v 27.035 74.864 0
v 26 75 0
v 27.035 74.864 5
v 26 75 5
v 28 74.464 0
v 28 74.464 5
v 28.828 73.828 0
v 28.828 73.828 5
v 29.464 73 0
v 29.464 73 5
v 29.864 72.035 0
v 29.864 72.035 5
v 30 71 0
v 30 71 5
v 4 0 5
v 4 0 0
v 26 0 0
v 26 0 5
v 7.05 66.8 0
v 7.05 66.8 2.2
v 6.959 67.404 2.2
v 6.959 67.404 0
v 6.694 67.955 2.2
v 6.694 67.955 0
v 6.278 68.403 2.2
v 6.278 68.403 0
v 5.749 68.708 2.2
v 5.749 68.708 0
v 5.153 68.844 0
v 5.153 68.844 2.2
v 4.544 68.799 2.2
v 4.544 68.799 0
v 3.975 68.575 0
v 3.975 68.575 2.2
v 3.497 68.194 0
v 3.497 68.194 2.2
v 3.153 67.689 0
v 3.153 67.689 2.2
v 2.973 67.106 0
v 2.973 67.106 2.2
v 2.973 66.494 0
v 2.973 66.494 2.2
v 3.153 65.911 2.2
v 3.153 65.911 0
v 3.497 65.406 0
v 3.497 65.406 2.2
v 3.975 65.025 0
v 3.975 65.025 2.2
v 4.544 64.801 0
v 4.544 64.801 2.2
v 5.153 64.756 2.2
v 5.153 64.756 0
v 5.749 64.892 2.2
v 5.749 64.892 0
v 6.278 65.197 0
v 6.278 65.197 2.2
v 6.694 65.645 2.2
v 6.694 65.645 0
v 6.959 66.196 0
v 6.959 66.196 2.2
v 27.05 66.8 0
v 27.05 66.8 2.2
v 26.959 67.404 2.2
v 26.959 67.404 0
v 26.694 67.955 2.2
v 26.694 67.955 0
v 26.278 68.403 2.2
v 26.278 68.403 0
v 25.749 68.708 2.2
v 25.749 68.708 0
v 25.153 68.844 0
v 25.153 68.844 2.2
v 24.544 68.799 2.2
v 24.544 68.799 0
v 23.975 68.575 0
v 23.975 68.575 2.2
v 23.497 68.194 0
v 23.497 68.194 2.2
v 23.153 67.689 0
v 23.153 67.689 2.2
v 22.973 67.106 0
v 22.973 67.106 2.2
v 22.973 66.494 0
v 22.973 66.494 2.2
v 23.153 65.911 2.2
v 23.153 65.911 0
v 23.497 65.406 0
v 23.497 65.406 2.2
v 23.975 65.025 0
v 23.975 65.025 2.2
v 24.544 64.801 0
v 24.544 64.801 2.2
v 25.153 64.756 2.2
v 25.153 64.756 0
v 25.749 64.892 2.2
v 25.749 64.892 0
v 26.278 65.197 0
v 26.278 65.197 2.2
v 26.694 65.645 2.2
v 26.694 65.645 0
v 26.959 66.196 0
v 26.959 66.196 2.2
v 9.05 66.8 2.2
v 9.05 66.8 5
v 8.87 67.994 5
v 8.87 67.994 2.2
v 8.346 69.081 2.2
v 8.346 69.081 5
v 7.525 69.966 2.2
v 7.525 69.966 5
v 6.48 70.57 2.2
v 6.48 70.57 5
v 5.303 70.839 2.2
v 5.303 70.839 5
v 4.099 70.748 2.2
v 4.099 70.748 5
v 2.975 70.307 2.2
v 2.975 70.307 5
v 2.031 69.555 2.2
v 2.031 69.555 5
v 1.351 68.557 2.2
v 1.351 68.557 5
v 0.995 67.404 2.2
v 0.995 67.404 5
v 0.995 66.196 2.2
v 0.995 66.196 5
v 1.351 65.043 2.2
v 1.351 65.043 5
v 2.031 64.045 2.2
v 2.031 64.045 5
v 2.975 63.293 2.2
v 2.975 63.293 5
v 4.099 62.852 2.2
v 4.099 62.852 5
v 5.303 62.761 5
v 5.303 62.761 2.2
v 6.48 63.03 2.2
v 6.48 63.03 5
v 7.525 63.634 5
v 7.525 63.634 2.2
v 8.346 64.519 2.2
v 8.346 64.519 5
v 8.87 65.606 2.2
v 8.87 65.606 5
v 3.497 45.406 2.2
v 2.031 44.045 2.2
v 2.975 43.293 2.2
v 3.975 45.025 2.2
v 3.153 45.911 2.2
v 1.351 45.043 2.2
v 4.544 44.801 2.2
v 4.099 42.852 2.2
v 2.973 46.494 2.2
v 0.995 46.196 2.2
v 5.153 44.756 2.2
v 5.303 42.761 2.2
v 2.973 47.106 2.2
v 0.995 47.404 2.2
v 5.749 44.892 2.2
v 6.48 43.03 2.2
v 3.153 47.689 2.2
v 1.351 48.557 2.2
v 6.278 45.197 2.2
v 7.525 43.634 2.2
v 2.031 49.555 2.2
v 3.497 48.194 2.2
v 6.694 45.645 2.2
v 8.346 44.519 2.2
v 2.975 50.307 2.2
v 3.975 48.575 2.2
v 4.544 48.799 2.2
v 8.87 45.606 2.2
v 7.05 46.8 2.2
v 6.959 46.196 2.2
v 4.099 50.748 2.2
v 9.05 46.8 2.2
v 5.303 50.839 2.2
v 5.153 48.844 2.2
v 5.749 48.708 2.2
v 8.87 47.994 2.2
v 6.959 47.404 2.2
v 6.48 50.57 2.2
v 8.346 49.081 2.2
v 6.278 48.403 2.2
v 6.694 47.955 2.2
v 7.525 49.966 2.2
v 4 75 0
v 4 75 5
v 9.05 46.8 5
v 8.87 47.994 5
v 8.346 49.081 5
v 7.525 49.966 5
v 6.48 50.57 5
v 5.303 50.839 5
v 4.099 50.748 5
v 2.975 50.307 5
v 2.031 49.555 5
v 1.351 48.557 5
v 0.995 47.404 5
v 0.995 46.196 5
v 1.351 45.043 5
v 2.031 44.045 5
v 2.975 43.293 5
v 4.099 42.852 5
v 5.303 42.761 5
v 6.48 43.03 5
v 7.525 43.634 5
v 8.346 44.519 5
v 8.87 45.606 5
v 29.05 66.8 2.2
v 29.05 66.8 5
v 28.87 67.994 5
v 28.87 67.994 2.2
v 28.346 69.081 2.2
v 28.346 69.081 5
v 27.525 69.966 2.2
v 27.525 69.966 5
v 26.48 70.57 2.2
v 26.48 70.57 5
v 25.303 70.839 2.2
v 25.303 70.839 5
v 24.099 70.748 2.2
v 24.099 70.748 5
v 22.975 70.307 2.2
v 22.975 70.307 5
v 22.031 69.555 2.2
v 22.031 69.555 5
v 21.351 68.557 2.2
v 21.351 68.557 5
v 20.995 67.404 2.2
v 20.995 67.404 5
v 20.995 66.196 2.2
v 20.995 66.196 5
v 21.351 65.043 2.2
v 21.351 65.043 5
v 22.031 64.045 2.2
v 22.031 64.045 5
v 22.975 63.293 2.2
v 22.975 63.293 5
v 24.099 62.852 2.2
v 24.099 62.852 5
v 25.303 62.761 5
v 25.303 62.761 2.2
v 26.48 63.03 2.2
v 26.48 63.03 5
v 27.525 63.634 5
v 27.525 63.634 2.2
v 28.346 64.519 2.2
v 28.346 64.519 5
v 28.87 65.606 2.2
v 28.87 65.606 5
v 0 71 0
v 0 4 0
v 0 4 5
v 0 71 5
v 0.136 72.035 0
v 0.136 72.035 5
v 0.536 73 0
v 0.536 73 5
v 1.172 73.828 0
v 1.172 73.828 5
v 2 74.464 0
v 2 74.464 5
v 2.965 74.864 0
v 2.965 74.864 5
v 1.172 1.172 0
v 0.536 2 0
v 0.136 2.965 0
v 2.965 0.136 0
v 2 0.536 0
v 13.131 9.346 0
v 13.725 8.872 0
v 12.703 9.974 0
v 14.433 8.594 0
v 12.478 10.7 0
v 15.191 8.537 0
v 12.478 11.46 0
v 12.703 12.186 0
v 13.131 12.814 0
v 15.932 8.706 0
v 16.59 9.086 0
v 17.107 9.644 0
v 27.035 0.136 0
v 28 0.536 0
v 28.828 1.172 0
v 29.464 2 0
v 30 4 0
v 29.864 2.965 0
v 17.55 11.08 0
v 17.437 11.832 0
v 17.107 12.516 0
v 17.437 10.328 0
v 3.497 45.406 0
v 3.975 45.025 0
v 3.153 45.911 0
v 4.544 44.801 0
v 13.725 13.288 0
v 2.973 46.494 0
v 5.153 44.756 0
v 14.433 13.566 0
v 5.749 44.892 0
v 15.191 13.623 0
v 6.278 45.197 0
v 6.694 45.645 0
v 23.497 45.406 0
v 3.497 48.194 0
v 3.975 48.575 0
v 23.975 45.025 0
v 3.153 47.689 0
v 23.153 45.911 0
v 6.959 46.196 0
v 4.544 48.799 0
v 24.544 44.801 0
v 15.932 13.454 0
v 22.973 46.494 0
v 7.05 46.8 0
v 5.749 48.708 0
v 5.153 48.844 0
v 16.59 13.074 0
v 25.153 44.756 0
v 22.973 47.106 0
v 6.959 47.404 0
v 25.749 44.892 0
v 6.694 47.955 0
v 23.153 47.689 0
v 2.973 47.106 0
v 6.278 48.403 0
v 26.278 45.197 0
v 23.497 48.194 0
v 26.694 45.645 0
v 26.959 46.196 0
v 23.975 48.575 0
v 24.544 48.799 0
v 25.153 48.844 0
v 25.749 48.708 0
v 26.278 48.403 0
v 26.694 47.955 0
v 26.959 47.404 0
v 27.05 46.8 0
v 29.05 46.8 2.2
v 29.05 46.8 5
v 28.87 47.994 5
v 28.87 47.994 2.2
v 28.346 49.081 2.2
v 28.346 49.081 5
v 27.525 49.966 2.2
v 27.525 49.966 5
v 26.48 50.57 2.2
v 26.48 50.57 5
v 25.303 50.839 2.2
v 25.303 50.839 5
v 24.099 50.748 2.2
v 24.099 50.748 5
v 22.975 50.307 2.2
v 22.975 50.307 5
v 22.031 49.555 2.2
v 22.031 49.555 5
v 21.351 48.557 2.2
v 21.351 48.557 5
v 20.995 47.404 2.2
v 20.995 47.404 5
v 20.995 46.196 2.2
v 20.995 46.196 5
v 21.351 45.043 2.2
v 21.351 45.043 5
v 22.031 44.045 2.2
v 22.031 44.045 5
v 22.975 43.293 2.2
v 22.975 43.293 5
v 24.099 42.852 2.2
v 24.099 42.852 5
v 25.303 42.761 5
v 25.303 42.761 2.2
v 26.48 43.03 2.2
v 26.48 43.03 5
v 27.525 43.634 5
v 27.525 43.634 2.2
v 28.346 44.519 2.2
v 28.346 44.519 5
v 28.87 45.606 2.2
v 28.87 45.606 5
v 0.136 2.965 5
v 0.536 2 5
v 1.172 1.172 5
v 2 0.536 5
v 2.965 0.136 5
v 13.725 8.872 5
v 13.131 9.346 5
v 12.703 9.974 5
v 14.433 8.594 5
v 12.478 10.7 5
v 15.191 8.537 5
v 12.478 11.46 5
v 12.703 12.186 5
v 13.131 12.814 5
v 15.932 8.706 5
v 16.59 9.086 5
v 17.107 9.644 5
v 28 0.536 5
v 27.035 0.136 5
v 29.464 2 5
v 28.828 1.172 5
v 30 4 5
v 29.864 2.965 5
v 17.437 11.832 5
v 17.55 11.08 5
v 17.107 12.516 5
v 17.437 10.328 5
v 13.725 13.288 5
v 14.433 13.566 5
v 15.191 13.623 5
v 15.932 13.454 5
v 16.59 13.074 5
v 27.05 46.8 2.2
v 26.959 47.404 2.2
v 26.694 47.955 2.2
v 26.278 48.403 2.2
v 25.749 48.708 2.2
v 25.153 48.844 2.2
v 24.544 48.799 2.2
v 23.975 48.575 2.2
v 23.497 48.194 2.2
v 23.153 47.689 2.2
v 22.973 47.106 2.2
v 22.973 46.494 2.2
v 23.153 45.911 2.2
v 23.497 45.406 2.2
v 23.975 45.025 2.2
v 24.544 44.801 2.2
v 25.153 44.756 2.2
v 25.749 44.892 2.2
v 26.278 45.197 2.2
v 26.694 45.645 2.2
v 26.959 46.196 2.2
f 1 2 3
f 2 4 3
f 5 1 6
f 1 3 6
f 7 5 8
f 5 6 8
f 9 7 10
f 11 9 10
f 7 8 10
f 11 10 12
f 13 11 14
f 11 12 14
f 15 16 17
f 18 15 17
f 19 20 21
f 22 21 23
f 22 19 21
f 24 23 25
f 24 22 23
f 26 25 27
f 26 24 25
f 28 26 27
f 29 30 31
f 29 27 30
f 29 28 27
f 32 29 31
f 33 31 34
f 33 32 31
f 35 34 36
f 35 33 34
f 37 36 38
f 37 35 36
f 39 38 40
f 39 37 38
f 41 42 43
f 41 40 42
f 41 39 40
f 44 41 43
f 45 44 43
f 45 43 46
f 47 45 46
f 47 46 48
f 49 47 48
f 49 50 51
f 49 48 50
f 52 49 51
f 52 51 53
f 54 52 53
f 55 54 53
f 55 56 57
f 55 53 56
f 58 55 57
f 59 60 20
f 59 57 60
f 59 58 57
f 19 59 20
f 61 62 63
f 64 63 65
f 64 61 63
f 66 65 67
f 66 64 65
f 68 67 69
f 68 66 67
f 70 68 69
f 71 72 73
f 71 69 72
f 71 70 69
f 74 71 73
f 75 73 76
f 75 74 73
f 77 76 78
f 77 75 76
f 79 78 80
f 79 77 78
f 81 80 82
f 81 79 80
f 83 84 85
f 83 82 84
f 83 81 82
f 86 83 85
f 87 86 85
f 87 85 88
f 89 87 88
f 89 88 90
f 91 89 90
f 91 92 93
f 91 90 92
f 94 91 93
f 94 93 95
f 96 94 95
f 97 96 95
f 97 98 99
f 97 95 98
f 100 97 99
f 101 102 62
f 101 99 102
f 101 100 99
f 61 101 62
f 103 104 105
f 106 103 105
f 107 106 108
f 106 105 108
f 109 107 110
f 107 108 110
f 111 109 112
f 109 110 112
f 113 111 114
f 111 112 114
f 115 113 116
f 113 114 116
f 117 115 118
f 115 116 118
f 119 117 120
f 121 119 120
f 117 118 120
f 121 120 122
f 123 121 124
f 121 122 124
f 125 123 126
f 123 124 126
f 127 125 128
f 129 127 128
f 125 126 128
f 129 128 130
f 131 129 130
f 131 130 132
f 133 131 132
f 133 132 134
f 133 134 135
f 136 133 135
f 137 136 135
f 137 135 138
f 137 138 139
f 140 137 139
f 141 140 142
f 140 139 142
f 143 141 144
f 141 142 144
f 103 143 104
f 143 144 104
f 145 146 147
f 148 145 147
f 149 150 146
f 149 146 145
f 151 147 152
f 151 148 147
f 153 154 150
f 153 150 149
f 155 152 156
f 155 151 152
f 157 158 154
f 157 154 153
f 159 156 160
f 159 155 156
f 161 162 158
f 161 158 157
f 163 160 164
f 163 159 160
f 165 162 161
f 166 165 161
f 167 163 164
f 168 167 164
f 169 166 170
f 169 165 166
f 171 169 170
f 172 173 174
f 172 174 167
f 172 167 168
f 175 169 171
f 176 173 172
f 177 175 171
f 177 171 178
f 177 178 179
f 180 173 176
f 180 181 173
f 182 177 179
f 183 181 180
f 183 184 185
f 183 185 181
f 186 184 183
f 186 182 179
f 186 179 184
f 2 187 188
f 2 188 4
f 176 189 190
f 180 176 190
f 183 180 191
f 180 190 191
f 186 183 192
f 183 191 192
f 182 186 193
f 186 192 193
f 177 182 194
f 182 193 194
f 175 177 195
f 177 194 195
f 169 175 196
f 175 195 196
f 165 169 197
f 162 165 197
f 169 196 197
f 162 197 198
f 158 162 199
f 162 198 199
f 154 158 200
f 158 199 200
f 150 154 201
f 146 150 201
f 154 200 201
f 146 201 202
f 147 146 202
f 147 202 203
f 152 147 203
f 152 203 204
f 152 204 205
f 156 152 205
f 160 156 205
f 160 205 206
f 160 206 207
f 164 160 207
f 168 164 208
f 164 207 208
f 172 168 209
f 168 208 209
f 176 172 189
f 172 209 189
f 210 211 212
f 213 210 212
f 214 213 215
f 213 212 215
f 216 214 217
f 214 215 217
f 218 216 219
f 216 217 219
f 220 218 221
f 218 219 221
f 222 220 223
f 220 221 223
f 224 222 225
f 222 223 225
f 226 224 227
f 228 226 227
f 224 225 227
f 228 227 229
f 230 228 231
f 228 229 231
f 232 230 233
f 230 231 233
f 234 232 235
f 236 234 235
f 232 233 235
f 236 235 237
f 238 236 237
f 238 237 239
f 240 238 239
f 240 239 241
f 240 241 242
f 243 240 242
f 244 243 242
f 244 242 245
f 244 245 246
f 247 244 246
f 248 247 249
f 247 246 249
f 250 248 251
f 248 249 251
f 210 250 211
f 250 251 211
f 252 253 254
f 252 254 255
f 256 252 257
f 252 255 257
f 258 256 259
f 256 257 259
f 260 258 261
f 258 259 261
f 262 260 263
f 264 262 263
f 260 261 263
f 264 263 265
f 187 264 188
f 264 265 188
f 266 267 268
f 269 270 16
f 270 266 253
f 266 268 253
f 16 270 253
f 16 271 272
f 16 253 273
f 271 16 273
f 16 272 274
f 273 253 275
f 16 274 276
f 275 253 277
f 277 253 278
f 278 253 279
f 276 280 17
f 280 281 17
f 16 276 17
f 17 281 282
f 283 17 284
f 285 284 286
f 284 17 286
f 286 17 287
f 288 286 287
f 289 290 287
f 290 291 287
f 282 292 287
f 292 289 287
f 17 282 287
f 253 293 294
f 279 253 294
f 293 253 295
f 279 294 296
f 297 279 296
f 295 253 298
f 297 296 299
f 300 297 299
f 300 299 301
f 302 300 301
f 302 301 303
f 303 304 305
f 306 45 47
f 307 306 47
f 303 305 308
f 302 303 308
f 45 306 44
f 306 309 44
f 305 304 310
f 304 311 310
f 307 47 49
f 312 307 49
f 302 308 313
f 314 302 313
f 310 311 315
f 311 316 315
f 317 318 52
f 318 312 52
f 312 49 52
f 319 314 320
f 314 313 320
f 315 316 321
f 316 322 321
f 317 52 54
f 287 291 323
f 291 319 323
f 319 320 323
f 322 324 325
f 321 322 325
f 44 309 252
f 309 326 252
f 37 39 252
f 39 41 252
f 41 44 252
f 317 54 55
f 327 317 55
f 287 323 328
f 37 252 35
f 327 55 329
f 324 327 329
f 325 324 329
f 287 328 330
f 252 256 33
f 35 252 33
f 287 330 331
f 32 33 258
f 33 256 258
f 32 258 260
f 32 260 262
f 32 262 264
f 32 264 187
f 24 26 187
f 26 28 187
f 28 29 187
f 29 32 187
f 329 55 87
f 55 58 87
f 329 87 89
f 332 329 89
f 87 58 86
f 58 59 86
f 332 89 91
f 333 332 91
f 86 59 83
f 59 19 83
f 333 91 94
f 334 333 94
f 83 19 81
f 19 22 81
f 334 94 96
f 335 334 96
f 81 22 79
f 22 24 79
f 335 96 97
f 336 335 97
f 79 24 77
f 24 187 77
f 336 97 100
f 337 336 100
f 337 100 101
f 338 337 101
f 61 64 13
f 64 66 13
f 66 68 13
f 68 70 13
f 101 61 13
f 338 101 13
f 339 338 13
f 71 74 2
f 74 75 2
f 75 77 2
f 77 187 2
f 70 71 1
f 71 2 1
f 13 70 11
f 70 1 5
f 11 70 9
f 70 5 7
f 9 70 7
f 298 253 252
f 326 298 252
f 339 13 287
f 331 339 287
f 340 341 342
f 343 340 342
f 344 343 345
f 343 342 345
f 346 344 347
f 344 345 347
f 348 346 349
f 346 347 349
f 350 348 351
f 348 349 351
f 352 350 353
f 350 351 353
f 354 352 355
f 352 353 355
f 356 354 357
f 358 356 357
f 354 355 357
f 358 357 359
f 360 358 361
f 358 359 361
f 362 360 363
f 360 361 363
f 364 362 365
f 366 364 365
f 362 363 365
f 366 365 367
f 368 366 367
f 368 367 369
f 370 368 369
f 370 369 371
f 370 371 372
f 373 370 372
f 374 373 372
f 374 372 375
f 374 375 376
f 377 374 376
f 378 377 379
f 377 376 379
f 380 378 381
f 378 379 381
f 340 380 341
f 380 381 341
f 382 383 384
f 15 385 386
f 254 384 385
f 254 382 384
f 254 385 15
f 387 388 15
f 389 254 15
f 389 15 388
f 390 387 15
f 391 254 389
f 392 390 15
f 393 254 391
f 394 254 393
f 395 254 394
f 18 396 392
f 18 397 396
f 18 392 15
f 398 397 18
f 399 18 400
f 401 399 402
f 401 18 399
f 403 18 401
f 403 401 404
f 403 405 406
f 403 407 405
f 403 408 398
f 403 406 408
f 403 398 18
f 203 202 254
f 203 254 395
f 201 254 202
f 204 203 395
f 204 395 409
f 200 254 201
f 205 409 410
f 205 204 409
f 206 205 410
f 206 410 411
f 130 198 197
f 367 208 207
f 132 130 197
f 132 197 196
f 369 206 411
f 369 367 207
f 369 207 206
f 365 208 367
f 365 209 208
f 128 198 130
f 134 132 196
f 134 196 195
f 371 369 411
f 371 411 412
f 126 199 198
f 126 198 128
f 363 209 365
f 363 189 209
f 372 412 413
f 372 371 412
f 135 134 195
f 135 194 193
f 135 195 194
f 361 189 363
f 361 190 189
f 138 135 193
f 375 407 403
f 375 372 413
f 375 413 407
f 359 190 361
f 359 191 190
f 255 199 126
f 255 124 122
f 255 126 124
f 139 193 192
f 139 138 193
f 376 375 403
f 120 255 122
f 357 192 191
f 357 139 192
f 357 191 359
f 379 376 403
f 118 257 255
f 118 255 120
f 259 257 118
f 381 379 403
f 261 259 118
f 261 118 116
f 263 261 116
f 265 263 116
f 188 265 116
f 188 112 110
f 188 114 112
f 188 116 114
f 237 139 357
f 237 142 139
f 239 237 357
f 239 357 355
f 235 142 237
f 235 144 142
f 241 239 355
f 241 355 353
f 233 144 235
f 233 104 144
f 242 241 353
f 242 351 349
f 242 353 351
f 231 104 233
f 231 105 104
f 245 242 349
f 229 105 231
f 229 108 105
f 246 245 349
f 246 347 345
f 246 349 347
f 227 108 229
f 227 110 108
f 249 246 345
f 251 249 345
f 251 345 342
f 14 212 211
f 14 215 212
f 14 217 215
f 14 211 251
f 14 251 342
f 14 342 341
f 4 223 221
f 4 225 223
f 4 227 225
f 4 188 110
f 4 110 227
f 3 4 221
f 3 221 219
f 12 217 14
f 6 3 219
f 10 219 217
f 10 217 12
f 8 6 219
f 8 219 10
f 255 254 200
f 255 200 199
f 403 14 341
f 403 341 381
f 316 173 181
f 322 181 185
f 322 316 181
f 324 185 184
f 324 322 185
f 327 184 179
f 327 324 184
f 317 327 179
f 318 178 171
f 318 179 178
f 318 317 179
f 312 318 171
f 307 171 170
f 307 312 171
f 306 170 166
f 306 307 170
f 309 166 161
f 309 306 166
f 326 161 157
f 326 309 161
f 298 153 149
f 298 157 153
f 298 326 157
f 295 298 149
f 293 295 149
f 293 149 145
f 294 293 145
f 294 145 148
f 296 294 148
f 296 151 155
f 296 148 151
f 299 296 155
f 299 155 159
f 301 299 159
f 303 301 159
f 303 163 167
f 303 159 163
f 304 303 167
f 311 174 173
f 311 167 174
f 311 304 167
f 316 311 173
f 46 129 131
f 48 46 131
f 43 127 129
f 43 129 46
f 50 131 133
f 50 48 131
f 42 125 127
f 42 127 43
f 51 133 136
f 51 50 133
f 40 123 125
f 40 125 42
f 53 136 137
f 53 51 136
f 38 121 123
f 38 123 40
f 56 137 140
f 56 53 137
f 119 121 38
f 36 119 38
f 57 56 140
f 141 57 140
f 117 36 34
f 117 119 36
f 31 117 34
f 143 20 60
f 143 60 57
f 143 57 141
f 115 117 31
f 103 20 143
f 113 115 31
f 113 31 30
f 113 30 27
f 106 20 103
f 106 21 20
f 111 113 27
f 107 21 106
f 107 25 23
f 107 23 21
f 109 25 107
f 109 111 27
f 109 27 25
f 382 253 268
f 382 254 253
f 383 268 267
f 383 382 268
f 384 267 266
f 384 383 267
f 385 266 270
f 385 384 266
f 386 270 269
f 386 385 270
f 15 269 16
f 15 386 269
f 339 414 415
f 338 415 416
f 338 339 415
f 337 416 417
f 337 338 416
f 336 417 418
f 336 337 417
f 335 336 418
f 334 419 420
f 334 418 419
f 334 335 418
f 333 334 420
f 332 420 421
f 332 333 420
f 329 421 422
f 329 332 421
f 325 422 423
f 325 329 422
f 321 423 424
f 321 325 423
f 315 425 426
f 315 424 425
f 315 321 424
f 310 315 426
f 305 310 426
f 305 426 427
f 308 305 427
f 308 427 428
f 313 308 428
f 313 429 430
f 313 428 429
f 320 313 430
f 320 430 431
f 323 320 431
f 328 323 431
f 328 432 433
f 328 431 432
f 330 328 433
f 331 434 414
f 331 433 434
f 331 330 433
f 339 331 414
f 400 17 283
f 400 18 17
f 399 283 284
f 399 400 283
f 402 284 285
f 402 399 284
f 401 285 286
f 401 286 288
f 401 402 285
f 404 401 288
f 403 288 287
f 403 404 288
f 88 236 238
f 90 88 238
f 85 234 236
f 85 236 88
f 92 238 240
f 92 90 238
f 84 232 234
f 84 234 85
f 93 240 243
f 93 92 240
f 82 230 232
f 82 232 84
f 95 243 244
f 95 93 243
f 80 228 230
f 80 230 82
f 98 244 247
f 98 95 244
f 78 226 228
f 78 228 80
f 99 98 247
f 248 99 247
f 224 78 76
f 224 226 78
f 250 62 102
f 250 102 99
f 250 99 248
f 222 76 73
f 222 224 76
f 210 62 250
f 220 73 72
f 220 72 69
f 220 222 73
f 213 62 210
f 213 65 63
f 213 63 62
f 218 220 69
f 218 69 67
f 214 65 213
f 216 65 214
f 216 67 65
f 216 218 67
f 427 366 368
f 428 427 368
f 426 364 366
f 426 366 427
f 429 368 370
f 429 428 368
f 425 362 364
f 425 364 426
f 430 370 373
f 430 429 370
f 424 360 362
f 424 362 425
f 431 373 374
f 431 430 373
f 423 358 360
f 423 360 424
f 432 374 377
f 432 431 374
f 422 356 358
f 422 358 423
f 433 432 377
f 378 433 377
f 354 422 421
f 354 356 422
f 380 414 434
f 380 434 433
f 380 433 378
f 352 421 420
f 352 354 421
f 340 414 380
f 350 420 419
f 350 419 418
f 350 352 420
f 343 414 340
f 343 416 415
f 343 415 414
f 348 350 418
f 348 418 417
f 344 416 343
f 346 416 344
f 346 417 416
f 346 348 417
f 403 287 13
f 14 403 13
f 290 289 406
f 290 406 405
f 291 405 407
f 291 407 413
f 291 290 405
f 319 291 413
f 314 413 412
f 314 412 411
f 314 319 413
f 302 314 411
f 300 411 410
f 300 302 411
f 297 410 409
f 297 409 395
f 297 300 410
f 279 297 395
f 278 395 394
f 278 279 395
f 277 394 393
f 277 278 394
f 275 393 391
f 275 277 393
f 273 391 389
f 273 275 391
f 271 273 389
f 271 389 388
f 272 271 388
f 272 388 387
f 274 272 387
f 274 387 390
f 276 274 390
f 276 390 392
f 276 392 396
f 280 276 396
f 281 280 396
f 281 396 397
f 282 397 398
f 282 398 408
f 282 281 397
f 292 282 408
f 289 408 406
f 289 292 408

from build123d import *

# Parameters (mm, degrees)
CROQUIS1_W              = 30
CROQUIS1_H              = 75
CROQUIS1_R              = 2.05
CROQUIS1_R_2            = 2.55
SALIENTE_EXTRUIR1_DEPTH = 5
REDONDEO1_R             = 4
CROQUIS4_R              = 4.05
CORTAR_EXTRUIR1_DEPTH   = 2.8


with BuildPart() as part:
    # Croquis1 → Saliente-Extruir1 (new body)
    with BuildSketch(Plane.XY):
        with Locations((15, 37.5)):
            Rectangle(CROQUIS1_W, CROQUIS1_H)
        with Locations((5, 66.8)):
            Circle(CROQUIS1_R, mode=Mode.SUBTRACT)
        with Locations((25, 66.8)):
            Circle(CROQUIS1_R, mode=Mode.SUBTRACT)
        with Locations((25, 46.8)):
            Circle(CROQUIS1_R, mode=Mode.SUBTRACT)
        with Locations((5, 46.8)):
            Circle(CROQUIS1_R, mode=Mode.SUBTRACT)
        with Locations((15, 11.08)):
            Circle(CROQUIS1_R_2, mode=Mode.SUBTRACT)
    extrude(amount=SALIENTE_EXTRUIR1_DEPTH)

    # Redondeo1
    redondeo1_edges = [part.edges().sort_by_distance(p)[0] for p in [
        (0, 75, 2.5),
        (30, 75, 2.5),
        (30, 0, 2.5),
        (0, 0, 2.5),
    ]]
    fillet(redondeo1_edges, radius=REDONDEO1_R)

    # Croquis4 → Cortar-Extruir1 (cut)
    with BuildSketch(Plane.XY.offset(5)):
        with Locations((5, 66.8)):
            Circle(CROQUIS4_R)
        with Locations((5, 46.8)):
            Circle(CROQUIS4_R)
        with Locations((25, 46.8)):
            Circle(CROQUIS4_R)
        with Locations((25, 66.8)):
            Circle(CROQUIS4_R)
    extrude(amount=-CORTAR_EXTRUIR1_DEPTH, mode=Mode.SUBTRACT)


solid = part.part
